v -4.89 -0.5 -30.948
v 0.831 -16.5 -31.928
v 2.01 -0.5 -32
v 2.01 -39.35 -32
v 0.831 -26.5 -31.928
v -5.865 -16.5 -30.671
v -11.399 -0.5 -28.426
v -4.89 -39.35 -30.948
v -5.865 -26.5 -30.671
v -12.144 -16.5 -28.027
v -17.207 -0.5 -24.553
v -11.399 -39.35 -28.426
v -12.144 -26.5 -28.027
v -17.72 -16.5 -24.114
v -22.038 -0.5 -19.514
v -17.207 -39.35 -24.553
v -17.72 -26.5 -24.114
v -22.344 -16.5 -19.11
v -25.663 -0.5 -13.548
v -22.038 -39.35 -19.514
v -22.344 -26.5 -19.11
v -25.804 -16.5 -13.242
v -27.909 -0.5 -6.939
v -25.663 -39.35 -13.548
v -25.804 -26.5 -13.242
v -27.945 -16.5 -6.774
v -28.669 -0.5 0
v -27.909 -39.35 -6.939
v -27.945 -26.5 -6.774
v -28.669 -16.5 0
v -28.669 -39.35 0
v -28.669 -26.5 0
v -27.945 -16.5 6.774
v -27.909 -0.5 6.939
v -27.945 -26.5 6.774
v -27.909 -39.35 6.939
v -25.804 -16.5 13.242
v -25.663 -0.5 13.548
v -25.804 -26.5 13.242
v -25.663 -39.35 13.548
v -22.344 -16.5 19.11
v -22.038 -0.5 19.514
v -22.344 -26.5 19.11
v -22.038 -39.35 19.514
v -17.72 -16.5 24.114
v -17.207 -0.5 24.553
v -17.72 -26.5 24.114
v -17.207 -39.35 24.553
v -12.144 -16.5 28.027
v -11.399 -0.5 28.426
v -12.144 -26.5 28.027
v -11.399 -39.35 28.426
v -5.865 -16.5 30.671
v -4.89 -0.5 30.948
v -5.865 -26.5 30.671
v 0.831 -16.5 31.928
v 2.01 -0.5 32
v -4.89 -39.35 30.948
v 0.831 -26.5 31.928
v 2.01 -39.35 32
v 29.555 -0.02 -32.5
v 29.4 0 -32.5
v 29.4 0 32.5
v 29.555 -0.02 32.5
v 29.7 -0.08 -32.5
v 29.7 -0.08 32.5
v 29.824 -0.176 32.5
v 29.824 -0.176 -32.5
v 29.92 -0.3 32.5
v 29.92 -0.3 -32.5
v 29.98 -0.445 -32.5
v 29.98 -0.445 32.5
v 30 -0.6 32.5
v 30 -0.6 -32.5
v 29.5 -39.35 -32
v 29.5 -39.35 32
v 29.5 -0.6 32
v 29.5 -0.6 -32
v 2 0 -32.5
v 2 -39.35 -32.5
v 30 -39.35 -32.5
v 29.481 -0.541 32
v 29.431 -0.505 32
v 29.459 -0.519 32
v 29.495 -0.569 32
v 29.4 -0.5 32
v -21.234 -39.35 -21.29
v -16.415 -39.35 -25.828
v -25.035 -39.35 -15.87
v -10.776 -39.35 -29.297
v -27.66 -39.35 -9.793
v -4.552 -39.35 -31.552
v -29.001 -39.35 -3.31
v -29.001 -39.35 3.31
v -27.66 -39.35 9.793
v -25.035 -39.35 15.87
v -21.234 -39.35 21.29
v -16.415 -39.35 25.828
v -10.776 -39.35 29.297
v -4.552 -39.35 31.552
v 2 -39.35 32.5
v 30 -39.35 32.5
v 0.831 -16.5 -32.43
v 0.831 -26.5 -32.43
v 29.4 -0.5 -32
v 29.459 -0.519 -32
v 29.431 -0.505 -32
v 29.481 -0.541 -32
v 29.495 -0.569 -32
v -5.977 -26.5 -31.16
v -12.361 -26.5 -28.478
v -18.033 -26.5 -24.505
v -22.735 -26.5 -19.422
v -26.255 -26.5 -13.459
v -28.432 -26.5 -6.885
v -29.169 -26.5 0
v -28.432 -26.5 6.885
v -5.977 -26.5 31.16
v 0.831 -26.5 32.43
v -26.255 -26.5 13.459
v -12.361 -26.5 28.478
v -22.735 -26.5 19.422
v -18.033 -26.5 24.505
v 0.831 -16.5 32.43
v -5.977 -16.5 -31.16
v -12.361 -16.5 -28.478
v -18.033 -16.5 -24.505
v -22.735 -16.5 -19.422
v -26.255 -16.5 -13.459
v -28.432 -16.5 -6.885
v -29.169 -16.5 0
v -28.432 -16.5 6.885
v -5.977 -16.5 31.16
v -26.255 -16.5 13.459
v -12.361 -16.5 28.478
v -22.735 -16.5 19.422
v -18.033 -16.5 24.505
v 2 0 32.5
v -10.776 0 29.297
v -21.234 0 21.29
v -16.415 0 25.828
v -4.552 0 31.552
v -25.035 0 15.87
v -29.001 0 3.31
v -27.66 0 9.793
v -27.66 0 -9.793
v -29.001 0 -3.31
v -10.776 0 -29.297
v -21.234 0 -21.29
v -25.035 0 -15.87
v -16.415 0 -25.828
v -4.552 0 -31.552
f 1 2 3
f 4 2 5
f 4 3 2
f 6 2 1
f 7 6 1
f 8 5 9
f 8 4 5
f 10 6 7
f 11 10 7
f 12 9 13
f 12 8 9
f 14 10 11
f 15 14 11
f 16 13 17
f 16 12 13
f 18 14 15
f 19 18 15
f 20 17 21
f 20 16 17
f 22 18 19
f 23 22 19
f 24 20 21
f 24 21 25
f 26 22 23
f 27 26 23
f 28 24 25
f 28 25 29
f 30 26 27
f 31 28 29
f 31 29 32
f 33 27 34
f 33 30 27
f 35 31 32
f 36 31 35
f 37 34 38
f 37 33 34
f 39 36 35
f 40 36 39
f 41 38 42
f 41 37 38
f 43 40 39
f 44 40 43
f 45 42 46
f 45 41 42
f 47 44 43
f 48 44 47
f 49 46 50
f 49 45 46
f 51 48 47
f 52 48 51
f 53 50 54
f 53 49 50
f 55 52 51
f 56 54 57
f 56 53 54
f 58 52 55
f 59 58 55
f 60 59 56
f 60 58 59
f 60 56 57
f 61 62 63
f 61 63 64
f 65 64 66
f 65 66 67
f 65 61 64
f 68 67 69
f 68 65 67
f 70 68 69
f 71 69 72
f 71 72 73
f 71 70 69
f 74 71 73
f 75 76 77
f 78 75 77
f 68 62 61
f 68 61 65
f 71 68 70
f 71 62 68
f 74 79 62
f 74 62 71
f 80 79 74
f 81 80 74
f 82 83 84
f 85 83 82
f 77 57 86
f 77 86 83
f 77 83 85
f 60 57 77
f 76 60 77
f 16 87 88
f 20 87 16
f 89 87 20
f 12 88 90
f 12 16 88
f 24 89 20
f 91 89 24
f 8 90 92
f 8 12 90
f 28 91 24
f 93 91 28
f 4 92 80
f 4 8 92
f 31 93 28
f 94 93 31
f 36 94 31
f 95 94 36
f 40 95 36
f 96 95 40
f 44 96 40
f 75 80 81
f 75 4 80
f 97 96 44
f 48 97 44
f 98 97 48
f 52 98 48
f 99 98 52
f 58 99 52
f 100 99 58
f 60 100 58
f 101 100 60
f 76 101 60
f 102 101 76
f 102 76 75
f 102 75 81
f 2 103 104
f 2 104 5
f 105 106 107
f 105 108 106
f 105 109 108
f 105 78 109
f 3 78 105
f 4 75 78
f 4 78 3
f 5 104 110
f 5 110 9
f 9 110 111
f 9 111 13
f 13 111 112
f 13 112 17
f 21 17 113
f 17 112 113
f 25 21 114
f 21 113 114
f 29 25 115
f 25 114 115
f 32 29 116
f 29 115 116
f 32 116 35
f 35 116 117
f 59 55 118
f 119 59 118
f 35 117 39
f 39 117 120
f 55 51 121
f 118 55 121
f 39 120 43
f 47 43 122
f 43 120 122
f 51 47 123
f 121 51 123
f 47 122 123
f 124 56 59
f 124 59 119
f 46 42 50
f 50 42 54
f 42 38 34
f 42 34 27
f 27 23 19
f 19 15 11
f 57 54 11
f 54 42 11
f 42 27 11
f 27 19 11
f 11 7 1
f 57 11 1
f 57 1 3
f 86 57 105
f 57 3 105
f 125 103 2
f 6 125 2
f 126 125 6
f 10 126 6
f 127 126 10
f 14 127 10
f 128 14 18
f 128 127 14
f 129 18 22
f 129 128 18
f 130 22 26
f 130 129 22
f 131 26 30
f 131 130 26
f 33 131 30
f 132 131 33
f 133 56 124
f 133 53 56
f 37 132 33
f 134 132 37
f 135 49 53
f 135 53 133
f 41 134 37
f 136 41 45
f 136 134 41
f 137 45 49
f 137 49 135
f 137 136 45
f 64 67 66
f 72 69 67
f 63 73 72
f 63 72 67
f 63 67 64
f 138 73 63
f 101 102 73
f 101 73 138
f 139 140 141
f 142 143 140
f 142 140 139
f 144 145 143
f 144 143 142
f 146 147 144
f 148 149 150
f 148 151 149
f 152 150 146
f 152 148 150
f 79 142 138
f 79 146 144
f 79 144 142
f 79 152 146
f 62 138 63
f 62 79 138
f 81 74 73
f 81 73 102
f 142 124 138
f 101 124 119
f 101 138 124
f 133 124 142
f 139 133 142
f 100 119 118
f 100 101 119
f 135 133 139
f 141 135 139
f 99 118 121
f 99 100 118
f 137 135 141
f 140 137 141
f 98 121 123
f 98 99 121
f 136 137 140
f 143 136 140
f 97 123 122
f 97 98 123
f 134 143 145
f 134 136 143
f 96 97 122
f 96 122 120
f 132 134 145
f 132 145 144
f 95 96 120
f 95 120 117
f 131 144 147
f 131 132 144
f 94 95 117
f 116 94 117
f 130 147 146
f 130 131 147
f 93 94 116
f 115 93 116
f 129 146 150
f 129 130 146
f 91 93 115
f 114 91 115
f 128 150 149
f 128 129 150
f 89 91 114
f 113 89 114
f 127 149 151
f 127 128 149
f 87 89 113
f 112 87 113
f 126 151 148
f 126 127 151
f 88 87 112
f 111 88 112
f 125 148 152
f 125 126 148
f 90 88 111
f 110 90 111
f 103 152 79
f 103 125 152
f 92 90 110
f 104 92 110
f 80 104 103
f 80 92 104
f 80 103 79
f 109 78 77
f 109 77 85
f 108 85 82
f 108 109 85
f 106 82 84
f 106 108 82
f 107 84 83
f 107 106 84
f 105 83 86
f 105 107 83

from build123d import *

# Parameters (mm, degrees)
SKETCH1_W                    = 60
SKETCH1_H                    = 65
BASE_FLANGE1_DEPTH           = 0.5
CUT_EXTRUDE1_DEPTH           = 45.232341109
EDGE_FLANGE1_STRIP_W         = 2.2
EDGE_FLANGE1_STRIP_H         = 0.5
EDGE_FLANGE1_STRIP_CUT_DEPTH = 65
EDGE_FLANGE1_DEPTH           = 65
EXTRUDE_THIN1_START          = 38.85
EXTRUDE_THIN1_DEPTH          = 38.85
SKETCH87_W                   = 65
SKETCH87_H                   = 10
CUT_EXTRUDE2_DEPTH           = 30


# Sheet-metal steps are written as plain solids
with BuildPart() as part:
    # Sketch1 → Base-Flange1 (new body)
    with BuildSketch(Plane(origin=(0, 0, 0), x_dir=(1, 0, 0), z_dir=(0, 1, 0))):
        Rectangle(SKETCH1_W, SKETCH1_H)
    extrude(amount=-BASE_FLANGE1_DEPTH)

    # Sketch7 → Cut-Extrude1 (cut, through all)
    with BuildSketch(Plane.XZ.offset(0.5)):
        with BuildLine():
            Line((2, 32.5), (-30, 32.5))
            Line((-30, 32.5), (-30, -32.5))
            Line((-30, -32.5), (2, -32.5))
            ThreePointArc((2, -32.5), (-29.169489574, 0), (2, 32.5))
        make_face()
    extrude(amount=-CUT_EXTRUDE1_DEPTH, mode=Mode.SUBTRACT)

    # Edge-Flange1 strip (across the edge) → Edge-Flange1 strip cut (cut)
    with BuildSketch(Plane(origin=(30, -0.5, -32.5), x_dir=(-1, 0, 0), z_dir=(0, 0, 1))):
        with Locations((-0.5, -0.25)):
            Rectangle(EDGE_FLANGE1_STRIP_W, EDGE_FLANGE1_STRIP_H)
    extrude(amount=EDGE_FLANGE1_STRIP_CUT_DEPTH, mode=Mode.SUBTRACT)

    # Edge-Flange1 section (across the edge) → Edge-Flange1 (add)
    with BuildSketch(Plane(origin=(30, -0.5, -32.5), x_dir=(-1, 0, 0), z_dir=(0, 0, 1))):
        with BuildLine():
            Line((0, 0.1), (0, 38.85))
            Line((0, 38.85), (0.5, 38.85))
            Line((0.5, 38.85), (0.5, 0.1))
            ThreePointArc((0.5, 0.1), (0.529289322, 0.029289322), (0.6, 0))
            Line((0.6, 0), (0.6, -0.5))
            ThreePointArc((0.6, -0.5), (0.175735931, -0.324264069), (0, 0.1))
        make_face()
    extrude(amount=EDGE_FLANGE1_DEPTH)

    # Sketch84 → Extrude-Thin1 (add)
    with BuildSketch(Plane.XZ.offset(0.5).offset(EXTRUDE_THIN1_START)):
        with BuildLine():
            Line((29.5, 32.5), (2, 32.5))
            ThreePointArc((2, 32.5), (-29.169489574, 0), (2, -32.5))
            Line((2, -32.5), (29.5, -32.5))
            Line((29.5, -32.5), (29.5, -32))
            Line((29.5, -32), (2.010489053, -32))
            ThreePointArc((2.010489053, -32), (-28.669489574, 0), (2.010489053, 32))
            Line((2.010489053, 32), (29.5, 32))
            Line((29.5, 32), (29.5, 32.5))
        make_face()
    extrude(amount=-EXTRUDE_THIN1_DEPTH)

    # Sketch87 → Cut-Extrude2 (cut)
    with BuildSketch(Plane.ZY.offset(29.169489574)):
        with Locations((0, -21.5)):
            Rectangle(SKETCH87_W, SKETCH87_H)
    extrude(amount=-CUT_EXTRUDE2_DEPTH, mode=Mode.SUBTRACT)


solid = part.part
